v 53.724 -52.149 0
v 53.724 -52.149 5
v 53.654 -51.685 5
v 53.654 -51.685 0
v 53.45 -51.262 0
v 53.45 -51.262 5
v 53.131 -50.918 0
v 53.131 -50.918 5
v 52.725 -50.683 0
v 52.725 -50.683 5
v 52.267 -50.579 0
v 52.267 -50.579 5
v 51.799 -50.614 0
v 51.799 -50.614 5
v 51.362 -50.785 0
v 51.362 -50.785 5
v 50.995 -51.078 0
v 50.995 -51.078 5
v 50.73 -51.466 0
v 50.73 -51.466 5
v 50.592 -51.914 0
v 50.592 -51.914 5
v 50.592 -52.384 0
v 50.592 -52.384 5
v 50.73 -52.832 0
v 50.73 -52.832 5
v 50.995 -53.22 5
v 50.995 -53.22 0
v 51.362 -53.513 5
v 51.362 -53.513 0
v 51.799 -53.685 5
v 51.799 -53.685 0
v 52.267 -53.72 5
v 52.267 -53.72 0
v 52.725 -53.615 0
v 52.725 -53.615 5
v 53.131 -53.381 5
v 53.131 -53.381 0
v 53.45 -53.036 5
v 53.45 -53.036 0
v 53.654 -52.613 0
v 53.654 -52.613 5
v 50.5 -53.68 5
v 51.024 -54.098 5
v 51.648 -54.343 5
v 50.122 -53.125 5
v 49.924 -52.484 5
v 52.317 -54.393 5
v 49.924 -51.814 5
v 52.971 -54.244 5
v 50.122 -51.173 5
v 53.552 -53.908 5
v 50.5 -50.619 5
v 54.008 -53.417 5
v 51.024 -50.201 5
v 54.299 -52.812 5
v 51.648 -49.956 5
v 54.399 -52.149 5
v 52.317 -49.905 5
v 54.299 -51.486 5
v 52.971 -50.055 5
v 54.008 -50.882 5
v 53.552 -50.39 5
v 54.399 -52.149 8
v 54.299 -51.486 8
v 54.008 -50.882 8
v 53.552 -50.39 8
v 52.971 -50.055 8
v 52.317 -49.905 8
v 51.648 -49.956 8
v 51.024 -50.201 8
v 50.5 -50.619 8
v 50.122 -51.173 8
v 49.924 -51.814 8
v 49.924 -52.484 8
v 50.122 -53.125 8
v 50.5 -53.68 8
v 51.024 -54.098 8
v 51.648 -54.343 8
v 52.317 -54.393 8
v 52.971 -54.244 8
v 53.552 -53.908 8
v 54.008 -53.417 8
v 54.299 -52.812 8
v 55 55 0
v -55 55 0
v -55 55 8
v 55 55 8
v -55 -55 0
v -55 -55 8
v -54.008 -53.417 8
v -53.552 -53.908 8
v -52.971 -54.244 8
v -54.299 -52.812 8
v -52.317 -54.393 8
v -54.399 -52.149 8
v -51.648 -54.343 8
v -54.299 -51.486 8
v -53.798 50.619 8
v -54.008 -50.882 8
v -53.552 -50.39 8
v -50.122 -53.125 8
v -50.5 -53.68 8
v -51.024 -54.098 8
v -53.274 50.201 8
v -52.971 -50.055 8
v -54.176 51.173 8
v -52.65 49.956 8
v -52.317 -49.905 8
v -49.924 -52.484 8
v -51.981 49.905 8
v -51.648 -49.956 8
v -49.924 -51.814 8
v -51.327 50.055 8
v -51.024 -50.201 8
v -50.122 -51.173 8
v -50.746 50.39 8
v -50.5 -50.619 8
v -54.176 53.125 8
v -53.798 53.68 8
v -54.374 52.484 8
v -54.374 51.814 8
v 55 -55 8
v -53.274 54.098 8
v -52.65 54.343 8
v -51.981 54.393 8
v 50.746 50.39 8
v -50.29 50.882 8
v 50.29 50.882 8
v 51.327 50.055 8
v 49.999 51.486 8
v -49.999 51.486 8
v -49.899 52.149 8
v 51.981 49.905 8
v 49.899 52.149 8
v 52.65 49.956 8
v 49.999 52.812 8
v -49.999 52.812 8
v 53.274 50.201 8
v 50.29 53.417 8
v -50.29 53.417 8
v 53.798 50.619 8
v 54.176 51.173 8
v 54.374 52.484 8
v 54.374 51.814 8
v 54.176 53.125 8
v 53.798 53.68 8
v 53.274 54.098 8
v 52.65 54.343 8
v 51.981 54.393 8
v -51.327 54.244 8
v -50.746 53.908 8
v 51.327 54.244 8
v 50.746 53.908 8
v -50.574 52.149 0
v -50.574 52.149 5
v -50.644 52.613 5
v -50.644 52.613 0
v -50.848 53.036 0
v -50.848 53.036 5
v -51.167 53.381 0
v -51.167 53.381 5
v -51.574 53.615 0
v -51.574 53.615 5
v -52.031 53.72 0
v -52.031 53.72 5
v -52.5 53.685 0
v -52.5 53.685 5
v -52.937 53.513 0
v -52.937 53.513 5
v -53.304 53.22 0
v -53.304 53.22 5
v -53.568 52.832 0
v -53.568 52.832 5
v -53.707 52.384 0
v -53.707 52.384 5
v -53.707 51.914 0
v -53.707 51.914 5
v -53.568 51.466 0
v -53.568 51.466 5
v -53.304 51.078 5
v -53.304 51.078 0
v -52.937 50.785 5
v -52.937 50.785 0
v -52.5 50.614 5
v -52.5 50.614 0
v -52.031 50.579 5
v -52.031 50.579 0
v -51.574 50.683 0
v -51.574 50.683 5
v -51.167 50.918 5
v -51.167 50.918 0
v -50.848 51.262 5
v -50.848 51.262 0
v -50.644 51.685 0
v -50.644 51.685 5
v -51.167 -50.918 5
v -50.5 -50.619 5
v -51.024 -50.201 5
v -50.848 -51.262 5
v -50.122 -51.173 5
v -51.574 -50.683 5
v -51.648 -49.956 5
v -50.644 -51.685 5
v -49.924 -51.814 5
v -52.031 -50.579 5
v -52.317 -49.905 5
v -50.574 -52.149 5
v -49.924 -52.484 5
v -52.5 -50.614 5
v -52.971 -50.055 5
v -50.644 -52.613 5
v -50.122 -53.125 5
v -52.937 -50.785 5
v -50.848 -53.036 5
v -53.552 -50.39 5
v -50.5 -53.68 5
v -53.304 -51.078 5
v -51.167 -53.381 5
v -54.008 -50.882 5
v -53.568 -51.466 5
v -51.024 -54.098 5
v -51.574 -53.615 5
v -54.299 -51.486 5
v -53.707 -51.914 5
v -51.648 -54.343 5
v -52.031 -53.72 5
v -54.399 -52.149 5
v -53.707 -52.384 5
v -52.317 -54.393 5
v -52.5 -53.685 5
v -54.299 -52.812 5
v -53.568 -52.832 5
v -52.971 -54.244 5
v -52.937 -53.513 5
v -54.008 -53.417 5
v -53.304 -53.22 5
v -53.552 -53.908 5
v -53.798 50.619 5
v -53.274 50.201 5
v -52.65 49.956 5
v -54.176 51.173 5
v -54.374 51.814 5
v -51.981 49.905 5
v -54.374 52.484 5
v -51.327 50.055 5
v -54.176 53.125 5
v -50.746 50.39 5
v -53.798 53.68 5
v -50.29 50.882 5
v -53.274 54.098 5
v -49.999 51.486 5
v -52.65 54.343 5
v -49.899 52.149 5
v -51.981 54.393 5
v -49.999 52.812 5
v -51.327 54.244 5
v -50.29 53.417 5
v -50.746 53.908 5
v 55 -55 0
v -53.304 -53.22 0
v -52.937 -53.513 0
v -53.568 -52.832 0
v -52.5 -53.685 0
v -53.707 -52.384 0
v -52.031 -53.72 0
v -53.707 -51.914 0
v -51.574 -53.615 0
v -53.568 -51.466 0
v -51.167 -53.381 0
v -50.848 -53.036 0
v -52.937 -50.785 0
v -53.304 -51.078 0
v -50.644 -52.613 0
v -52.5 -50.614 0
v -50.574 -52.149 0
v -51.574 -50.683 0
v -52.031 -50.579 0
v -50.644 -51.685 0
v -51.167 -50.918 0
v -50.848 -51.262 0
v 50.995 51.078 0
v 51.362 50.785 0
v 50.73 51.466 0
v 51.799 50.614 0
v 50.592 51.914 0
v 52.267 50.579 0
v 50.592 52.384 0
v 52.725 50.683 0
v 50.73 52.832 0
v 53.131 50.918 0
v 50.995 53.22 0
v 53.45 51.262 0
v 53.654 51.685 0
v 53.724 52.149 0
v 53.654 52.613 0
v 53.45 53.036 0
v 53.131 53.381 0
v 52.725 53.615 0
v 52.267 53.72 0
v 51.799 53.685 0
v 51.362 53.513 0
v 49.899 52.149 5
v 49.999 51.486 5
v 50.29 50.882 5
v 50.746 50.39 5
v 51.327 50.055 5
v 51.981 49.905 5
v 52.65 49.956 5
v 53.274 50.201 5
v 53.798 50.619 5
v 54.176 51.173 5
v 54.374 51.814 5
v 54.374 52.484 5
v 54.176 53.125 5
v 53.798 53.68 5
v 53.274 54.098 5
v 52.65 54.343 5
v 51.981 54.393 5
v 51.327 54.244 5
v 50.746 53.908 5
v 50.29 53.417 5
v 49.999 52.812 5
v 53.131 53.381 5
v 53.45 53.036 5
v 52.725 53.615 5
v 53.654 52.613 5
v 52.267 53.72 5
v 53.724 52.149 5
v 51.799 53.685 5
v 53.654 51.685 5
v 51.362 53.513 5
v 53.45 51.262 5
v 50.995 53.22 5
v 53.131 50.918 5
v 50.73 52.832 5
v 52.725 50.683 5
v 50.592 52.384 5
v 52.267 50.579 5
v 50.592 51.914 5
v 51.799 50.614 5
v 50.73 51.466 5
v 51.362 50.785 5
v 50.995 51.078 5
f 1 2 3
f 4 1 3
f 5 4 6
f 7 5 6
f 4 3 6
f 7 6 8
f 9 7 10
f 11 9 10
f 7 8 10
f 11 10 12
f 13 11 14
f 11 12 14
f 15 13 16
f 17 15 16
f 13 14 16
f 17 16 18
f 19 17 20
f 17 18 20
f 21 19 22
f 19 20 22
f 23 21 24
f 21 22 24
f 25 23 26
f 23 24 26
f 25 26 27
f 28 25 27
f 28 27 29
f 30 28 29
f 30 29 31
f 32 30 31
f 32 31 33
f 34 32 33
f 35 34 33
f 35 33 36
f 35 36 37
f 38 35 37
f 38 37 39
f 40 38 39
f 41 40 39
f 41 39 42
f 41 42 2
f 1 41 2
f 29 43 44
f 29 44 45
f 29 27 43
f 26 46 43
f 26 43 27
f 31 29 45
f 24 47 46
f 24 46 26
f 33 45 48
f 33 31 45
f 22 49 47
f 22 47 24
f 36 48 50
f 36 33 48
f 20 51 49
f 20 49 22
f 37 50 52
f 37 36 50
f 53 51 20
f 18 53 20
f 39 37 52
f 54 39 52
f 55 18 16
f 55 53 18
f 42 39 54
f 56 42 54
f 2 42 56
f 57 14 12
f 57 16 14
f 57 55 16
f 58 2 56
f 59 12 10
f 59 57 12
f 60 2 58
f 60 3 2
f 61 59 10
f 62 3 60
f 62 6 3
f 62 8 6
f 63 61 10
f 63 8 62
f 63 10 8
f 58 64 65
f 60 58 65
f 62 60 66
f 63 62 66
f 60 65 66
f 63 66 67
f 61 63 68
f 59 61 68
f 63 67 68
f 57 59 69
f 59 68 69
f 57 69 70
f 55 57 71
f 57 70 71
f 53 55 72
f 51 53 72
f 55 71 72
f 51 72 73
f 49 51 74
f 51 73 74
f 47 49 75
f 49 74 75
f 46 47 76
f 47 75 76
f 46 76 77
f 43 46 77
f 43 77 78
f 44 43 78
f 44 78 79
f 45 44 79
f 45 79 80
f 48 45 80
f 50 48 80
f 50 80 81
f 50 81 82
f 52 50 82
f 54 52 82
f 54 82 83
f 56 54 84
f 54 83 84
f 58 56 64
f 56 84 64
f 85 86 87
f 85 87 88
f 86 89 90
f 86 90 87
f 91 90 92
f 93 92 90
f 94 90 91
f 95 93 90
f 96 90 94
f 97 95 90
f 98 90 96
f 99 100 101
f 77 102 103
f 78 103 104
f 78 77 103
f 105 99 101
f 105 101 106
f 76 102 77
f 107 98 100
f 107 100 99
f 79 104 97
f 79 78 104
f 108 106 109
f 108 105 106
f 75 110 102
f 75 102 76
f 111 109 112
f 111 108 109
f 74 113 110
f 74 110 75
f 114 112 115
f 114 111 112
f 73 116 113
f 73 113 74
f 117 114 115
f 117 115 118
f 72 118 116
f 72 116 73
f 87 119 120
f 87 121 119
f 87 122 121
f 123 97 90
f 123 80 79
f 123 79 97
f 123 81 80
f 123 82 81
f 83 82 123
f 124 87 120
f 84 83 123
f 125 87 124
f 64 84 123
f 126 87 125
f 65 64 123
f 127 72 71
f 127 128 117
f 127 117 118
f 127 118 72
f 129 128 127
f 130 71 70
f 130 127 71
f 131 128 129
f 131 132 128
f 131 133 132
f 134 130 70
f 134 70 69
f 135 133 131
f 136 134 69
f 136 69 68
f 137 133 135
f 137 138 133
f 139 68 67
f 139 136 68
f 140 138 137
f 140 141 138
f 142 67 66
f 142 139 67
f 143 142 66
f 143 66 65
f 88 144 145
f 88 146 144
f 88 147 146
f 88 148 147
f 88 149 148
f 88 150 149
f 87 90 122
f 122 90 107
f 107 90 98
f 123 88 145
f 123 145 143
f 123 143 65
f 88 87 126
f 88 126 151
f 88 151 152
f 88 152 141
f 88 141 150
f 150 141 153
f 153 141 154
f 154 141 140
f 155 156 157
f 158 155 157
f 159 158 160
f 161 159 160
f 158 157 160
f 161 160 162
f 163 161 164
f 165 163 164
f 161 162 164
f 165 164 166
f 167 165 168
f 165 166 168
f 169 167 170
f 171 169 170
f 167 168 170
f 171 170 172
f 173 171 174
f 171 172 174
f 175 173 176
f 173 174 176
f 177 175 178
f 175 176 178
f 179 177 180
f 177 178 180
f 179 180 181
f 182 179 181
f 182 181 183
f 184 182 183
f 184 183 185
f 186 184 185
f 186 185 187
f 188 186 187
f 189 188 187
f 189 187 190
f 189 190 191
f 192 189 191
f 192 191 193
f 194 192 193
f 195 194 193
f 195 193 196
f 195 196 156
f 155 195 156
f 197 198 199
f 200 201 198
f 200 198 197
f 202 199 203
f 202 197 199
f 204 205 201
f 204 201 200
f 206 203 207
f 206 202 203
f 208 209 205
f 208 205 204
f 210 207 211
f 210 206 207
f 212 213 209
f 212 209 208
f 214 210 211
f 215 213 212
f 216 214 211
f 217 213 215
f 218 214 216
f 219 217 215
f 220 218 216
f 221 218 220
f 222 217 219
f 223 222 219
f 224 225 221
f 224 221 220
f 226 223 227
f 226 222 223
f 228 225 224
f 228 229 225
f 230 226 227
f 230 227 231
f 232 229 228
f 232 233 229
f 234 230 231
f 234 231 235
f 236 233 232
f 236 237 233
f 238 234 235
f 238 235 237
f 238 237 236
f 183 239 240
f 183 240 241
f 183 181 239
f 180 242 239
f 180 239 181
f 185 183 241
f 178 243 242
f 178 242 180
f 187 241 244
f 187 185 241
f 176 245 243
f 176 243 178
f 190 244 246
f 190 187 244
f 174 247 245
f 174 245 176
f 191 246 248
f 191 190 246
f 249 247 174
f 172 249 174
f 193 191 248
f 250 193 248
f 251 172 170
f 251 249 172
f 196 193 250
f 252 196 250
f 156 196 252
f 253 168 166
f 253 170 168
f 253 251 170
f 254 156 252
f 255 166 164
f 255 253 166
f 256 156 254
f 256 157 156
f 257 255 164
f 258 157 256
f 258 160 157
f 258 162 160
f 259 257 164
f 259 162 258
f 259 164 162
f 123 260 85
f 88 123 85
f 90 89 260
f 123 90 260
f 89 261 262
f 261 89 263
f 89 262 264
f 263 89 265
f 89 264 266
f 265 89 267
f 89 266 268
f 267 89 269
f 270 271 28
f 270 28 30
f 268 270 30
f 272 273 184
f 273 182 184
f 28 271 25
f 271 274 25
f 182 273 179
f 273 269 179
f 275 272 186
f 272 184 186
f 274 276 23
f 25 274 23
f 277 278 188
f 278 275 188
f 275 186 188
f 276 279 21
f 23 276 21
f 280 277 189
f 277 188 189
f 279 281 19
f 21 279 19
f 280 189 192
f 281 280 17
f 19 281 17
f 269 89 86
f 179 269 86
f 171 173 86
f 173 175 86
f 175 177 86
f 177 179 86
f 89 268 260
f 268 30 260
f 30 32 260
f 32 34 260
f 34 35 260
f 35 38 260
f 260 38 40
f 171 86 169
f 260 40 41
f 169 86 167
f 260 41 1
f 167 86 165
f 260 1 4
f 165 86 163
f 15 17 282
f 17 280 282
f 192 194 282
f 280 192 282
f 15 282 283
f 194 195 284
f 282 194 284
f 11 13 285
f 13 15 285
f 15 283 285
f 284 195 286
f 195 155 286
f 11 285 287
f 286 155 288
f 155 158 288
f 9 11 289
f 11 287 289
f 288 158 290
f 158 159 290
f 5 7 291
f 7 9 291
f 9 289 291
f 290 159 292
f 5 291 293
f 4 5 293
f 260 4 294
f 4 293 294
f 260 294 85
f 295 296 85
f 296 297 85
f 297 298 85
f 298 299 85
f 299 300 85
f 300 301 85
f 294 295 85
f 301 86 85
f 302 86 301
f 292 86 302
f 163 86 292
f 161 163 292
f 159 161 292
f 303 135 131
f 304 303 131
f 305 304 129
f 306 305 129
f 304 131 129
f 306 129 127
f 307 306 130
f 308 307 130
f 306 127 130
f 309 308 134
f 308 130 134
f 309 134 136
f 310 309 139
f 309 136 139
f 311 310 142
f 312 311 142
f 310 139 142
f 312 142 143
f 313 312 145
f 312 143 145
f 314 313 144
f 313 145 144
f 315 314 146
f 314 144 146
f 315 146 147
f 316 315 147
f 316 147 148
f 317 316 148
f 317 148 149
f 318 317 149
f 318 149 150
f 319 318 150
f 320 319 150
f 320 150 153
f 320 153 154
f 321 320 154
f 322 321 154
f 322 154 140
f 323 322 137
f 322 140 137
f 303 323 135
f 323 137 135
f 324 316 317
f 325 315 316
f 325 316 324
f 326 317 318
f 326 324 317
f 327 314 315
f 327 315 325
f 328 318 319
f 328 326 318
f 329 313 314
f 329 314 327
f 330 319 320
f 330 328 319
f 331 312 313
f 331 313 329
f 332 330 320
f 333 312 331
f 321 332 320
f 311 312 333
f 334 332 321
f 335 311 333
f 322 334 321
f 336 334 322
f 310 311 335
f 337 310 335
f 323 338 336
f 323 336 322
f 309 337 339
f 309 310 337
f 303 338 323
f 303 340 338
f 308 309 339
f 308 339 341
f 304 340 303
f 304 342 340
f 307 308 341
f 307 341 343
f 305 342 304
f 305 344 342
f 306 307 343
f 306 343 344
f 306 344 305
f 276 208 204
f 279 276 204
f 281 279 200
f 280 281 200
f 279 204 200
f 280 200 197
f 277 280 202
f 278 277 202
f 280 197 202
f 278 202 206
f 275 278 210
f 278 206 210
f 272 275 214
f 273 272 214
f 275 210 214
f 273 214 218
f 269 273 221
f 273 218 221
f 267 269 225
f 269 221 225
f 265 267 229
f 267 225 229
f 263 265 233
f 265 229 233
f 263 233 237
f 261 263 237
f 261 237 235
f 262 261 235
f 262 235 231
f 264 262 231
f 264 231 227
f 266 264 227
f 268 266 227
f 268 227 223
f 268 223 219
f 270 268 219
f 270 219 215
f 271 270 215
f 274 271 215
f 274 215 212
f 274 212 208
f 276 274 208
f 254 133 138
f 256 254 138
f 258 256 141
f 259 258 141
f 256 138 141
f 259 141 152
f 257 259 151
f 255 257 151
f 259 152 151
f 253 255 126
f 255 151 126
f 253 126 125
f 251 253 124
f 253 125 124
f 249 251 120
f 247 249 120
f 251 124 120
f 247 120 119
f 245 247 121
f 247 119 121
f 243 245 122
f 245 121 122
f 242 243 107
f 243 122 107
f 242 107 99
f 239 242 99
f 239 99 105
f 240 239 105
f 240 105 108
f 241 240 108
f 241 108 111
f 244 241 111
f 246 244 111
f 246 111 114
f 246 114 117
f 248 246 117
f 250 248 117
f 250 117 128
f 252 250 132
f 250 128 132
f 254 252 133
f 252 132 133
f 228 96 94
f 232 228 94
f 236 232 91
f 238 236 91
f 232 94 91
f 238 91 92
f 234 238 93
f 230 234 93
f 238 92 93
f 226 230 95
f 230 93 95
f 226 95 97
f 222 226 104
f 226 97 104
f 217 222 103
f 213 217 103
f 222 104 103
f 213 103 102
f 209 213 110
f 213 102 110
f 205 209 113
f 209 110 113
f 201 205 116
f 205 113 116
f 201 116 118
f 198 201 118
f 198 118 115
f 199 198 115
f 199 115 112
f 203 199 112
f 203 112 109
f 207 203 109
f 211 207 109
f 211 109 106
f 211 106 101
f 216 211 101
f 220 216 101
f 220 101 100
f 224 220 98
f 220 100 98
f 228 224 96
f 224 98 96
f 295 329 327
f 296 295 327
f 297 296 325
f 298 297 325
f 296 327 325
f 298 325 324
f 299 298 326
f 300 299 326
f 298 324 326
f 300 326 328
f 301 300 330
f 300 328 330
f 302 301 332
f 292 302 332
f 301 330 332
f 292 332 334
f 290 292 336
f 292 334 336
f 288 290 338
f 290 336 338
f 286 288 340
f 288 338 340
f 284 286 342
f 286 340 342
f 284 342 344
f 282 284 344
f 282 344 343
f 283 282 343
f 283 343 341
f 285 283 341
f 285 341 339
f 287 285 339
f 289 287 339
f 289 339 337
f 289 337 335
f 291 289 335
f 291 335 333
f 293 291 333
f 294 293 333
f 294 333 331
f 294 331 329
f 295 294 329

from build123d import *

# Parameters (mm, degrees)
SKETCH2_W           = 110
SKETCH2_H           = 110
BOSS_EXTRUDE1_DEPTH = 8
CUT_EXTRUDE1_REACH  = 80.192
SKETCH4_R           = 1.575
SKETCH5_R           = 2.25
CUT_EXTRUDE2_DEPTH  = 3


with BuildPart() as part:
    # Sketch2 → Boss-Extrude1 (new body)
    with BuildSketch(Plane.XY):
        Rectangle(SKETCH2_W, SKETCH2_H)
    extrude(amount=BOSS_EXTRUDE1_DEPTH)

    # Sketch4 → Cut-Extrude1 (cut, up to next)
    with BuildSketch(Plane.XY.offset(8), mode=Mode.PRIVATE) as cut_extrude1_sk1:
        with Locations((-52.149125113, 52.149125113)):
            Circle(SKETCH4_R)
    cut_extrude1_tool1 = extrude(cut_extrude1_sk1.sketch, amount=-CUT_EXTRUDE1_REACH, mode=Mode.PRIVATE) & part.part
    # Sketch4 → Cut-Extrude1 (cut, up to next)
    with BuildSketch(Plane.XY.offset(8), mode=Mode.PRIVATE) as cut_extrude1_sk2:
        with Locations((-52.149125113, -52.149125113)):
            Circle(SKETCH4_R)
    cut_extrude1_tool2 = extrude(cut_extrude1_sk2.sketch, amount=-CUT_EXTRUDE1_REACH, mode=Mode.PRIVATE) & part.part
    # Sketch4 → Cut-Extrude1 (cut, up to next)
    with BuildSketch(Plane.XY.offset(8), mode=Mode.PRIVATE) as cut_extrude1_sk3:
        with Locations((52.149125113, -52.149125113)):
            Circle(SKETCH4_R)
    cut_extrude1_tool3 = extrude(cut_extrude1_sk3.sketch, amount=-CUT_EXTRUDE1_REACH, mode=Mode.PRIVATE) & part.part
    # Sketch4 → Cut-Extrude1 (cut, up to next)
    with BuildSketch(Plane.XY.offset(8), mode=Mode.PRIVATE) as cut_extrude1_sk4:
        with Locations((52.149125113, 52.149125113)):
            Circle(SKETCH4_R)
    cut_extrude1_tool4 = extrude(cut_extrude1_sk4.sketch, amount=-CUT_EXTRUDE1_REACH, mode=Mode.PRIVATE) & part.part
    add(cut_extrude1_tool1.solids().sort_by_distance((-52.149125, 52.149125, 8))[0], mode=Mode.SUBTRACT)
    add(cut_extrude1_tool2.solids().sort_by_distance((-52.149125, -52.149125, 8))[0], mode=Mode.SUBTRACT)
    add(cut_extrude1_tool3.solids().sort_by_distance((52.149125, -52.149125, 8))[0], mode=Mode.SUBTRACT)
    add(cut_extrude1_tool4.solids().sort_by_distance((52.149125, 52.149125, 8))[0], mode=Mode.SUBTRACT)

    # Sketch5 → Cut-Extrude2 (cut)
    with BuildSketch(Plane.XY.offset(8)):
        with Locations((-52.149125113, 52.149125113)):
            Circle(SKETCH5_R)
        with Locations(Location((-52.149125113, -52.149125113, 0), (0, 0, 180))):
            Circle(SKETCH5_R)
        with Locations((52.149125113, -52.149125113)):
            Circle(SKETCH5_R)
        with Locations(Location((52.149125113, 52.149125113, 0), (0, 0, 180))):
            Circle(SKETCH5_R)
    extrude(amount=-CUT_EXTRUDE2_DEPTH, mode=Mode.SUBTRACT)


solid = part.part
